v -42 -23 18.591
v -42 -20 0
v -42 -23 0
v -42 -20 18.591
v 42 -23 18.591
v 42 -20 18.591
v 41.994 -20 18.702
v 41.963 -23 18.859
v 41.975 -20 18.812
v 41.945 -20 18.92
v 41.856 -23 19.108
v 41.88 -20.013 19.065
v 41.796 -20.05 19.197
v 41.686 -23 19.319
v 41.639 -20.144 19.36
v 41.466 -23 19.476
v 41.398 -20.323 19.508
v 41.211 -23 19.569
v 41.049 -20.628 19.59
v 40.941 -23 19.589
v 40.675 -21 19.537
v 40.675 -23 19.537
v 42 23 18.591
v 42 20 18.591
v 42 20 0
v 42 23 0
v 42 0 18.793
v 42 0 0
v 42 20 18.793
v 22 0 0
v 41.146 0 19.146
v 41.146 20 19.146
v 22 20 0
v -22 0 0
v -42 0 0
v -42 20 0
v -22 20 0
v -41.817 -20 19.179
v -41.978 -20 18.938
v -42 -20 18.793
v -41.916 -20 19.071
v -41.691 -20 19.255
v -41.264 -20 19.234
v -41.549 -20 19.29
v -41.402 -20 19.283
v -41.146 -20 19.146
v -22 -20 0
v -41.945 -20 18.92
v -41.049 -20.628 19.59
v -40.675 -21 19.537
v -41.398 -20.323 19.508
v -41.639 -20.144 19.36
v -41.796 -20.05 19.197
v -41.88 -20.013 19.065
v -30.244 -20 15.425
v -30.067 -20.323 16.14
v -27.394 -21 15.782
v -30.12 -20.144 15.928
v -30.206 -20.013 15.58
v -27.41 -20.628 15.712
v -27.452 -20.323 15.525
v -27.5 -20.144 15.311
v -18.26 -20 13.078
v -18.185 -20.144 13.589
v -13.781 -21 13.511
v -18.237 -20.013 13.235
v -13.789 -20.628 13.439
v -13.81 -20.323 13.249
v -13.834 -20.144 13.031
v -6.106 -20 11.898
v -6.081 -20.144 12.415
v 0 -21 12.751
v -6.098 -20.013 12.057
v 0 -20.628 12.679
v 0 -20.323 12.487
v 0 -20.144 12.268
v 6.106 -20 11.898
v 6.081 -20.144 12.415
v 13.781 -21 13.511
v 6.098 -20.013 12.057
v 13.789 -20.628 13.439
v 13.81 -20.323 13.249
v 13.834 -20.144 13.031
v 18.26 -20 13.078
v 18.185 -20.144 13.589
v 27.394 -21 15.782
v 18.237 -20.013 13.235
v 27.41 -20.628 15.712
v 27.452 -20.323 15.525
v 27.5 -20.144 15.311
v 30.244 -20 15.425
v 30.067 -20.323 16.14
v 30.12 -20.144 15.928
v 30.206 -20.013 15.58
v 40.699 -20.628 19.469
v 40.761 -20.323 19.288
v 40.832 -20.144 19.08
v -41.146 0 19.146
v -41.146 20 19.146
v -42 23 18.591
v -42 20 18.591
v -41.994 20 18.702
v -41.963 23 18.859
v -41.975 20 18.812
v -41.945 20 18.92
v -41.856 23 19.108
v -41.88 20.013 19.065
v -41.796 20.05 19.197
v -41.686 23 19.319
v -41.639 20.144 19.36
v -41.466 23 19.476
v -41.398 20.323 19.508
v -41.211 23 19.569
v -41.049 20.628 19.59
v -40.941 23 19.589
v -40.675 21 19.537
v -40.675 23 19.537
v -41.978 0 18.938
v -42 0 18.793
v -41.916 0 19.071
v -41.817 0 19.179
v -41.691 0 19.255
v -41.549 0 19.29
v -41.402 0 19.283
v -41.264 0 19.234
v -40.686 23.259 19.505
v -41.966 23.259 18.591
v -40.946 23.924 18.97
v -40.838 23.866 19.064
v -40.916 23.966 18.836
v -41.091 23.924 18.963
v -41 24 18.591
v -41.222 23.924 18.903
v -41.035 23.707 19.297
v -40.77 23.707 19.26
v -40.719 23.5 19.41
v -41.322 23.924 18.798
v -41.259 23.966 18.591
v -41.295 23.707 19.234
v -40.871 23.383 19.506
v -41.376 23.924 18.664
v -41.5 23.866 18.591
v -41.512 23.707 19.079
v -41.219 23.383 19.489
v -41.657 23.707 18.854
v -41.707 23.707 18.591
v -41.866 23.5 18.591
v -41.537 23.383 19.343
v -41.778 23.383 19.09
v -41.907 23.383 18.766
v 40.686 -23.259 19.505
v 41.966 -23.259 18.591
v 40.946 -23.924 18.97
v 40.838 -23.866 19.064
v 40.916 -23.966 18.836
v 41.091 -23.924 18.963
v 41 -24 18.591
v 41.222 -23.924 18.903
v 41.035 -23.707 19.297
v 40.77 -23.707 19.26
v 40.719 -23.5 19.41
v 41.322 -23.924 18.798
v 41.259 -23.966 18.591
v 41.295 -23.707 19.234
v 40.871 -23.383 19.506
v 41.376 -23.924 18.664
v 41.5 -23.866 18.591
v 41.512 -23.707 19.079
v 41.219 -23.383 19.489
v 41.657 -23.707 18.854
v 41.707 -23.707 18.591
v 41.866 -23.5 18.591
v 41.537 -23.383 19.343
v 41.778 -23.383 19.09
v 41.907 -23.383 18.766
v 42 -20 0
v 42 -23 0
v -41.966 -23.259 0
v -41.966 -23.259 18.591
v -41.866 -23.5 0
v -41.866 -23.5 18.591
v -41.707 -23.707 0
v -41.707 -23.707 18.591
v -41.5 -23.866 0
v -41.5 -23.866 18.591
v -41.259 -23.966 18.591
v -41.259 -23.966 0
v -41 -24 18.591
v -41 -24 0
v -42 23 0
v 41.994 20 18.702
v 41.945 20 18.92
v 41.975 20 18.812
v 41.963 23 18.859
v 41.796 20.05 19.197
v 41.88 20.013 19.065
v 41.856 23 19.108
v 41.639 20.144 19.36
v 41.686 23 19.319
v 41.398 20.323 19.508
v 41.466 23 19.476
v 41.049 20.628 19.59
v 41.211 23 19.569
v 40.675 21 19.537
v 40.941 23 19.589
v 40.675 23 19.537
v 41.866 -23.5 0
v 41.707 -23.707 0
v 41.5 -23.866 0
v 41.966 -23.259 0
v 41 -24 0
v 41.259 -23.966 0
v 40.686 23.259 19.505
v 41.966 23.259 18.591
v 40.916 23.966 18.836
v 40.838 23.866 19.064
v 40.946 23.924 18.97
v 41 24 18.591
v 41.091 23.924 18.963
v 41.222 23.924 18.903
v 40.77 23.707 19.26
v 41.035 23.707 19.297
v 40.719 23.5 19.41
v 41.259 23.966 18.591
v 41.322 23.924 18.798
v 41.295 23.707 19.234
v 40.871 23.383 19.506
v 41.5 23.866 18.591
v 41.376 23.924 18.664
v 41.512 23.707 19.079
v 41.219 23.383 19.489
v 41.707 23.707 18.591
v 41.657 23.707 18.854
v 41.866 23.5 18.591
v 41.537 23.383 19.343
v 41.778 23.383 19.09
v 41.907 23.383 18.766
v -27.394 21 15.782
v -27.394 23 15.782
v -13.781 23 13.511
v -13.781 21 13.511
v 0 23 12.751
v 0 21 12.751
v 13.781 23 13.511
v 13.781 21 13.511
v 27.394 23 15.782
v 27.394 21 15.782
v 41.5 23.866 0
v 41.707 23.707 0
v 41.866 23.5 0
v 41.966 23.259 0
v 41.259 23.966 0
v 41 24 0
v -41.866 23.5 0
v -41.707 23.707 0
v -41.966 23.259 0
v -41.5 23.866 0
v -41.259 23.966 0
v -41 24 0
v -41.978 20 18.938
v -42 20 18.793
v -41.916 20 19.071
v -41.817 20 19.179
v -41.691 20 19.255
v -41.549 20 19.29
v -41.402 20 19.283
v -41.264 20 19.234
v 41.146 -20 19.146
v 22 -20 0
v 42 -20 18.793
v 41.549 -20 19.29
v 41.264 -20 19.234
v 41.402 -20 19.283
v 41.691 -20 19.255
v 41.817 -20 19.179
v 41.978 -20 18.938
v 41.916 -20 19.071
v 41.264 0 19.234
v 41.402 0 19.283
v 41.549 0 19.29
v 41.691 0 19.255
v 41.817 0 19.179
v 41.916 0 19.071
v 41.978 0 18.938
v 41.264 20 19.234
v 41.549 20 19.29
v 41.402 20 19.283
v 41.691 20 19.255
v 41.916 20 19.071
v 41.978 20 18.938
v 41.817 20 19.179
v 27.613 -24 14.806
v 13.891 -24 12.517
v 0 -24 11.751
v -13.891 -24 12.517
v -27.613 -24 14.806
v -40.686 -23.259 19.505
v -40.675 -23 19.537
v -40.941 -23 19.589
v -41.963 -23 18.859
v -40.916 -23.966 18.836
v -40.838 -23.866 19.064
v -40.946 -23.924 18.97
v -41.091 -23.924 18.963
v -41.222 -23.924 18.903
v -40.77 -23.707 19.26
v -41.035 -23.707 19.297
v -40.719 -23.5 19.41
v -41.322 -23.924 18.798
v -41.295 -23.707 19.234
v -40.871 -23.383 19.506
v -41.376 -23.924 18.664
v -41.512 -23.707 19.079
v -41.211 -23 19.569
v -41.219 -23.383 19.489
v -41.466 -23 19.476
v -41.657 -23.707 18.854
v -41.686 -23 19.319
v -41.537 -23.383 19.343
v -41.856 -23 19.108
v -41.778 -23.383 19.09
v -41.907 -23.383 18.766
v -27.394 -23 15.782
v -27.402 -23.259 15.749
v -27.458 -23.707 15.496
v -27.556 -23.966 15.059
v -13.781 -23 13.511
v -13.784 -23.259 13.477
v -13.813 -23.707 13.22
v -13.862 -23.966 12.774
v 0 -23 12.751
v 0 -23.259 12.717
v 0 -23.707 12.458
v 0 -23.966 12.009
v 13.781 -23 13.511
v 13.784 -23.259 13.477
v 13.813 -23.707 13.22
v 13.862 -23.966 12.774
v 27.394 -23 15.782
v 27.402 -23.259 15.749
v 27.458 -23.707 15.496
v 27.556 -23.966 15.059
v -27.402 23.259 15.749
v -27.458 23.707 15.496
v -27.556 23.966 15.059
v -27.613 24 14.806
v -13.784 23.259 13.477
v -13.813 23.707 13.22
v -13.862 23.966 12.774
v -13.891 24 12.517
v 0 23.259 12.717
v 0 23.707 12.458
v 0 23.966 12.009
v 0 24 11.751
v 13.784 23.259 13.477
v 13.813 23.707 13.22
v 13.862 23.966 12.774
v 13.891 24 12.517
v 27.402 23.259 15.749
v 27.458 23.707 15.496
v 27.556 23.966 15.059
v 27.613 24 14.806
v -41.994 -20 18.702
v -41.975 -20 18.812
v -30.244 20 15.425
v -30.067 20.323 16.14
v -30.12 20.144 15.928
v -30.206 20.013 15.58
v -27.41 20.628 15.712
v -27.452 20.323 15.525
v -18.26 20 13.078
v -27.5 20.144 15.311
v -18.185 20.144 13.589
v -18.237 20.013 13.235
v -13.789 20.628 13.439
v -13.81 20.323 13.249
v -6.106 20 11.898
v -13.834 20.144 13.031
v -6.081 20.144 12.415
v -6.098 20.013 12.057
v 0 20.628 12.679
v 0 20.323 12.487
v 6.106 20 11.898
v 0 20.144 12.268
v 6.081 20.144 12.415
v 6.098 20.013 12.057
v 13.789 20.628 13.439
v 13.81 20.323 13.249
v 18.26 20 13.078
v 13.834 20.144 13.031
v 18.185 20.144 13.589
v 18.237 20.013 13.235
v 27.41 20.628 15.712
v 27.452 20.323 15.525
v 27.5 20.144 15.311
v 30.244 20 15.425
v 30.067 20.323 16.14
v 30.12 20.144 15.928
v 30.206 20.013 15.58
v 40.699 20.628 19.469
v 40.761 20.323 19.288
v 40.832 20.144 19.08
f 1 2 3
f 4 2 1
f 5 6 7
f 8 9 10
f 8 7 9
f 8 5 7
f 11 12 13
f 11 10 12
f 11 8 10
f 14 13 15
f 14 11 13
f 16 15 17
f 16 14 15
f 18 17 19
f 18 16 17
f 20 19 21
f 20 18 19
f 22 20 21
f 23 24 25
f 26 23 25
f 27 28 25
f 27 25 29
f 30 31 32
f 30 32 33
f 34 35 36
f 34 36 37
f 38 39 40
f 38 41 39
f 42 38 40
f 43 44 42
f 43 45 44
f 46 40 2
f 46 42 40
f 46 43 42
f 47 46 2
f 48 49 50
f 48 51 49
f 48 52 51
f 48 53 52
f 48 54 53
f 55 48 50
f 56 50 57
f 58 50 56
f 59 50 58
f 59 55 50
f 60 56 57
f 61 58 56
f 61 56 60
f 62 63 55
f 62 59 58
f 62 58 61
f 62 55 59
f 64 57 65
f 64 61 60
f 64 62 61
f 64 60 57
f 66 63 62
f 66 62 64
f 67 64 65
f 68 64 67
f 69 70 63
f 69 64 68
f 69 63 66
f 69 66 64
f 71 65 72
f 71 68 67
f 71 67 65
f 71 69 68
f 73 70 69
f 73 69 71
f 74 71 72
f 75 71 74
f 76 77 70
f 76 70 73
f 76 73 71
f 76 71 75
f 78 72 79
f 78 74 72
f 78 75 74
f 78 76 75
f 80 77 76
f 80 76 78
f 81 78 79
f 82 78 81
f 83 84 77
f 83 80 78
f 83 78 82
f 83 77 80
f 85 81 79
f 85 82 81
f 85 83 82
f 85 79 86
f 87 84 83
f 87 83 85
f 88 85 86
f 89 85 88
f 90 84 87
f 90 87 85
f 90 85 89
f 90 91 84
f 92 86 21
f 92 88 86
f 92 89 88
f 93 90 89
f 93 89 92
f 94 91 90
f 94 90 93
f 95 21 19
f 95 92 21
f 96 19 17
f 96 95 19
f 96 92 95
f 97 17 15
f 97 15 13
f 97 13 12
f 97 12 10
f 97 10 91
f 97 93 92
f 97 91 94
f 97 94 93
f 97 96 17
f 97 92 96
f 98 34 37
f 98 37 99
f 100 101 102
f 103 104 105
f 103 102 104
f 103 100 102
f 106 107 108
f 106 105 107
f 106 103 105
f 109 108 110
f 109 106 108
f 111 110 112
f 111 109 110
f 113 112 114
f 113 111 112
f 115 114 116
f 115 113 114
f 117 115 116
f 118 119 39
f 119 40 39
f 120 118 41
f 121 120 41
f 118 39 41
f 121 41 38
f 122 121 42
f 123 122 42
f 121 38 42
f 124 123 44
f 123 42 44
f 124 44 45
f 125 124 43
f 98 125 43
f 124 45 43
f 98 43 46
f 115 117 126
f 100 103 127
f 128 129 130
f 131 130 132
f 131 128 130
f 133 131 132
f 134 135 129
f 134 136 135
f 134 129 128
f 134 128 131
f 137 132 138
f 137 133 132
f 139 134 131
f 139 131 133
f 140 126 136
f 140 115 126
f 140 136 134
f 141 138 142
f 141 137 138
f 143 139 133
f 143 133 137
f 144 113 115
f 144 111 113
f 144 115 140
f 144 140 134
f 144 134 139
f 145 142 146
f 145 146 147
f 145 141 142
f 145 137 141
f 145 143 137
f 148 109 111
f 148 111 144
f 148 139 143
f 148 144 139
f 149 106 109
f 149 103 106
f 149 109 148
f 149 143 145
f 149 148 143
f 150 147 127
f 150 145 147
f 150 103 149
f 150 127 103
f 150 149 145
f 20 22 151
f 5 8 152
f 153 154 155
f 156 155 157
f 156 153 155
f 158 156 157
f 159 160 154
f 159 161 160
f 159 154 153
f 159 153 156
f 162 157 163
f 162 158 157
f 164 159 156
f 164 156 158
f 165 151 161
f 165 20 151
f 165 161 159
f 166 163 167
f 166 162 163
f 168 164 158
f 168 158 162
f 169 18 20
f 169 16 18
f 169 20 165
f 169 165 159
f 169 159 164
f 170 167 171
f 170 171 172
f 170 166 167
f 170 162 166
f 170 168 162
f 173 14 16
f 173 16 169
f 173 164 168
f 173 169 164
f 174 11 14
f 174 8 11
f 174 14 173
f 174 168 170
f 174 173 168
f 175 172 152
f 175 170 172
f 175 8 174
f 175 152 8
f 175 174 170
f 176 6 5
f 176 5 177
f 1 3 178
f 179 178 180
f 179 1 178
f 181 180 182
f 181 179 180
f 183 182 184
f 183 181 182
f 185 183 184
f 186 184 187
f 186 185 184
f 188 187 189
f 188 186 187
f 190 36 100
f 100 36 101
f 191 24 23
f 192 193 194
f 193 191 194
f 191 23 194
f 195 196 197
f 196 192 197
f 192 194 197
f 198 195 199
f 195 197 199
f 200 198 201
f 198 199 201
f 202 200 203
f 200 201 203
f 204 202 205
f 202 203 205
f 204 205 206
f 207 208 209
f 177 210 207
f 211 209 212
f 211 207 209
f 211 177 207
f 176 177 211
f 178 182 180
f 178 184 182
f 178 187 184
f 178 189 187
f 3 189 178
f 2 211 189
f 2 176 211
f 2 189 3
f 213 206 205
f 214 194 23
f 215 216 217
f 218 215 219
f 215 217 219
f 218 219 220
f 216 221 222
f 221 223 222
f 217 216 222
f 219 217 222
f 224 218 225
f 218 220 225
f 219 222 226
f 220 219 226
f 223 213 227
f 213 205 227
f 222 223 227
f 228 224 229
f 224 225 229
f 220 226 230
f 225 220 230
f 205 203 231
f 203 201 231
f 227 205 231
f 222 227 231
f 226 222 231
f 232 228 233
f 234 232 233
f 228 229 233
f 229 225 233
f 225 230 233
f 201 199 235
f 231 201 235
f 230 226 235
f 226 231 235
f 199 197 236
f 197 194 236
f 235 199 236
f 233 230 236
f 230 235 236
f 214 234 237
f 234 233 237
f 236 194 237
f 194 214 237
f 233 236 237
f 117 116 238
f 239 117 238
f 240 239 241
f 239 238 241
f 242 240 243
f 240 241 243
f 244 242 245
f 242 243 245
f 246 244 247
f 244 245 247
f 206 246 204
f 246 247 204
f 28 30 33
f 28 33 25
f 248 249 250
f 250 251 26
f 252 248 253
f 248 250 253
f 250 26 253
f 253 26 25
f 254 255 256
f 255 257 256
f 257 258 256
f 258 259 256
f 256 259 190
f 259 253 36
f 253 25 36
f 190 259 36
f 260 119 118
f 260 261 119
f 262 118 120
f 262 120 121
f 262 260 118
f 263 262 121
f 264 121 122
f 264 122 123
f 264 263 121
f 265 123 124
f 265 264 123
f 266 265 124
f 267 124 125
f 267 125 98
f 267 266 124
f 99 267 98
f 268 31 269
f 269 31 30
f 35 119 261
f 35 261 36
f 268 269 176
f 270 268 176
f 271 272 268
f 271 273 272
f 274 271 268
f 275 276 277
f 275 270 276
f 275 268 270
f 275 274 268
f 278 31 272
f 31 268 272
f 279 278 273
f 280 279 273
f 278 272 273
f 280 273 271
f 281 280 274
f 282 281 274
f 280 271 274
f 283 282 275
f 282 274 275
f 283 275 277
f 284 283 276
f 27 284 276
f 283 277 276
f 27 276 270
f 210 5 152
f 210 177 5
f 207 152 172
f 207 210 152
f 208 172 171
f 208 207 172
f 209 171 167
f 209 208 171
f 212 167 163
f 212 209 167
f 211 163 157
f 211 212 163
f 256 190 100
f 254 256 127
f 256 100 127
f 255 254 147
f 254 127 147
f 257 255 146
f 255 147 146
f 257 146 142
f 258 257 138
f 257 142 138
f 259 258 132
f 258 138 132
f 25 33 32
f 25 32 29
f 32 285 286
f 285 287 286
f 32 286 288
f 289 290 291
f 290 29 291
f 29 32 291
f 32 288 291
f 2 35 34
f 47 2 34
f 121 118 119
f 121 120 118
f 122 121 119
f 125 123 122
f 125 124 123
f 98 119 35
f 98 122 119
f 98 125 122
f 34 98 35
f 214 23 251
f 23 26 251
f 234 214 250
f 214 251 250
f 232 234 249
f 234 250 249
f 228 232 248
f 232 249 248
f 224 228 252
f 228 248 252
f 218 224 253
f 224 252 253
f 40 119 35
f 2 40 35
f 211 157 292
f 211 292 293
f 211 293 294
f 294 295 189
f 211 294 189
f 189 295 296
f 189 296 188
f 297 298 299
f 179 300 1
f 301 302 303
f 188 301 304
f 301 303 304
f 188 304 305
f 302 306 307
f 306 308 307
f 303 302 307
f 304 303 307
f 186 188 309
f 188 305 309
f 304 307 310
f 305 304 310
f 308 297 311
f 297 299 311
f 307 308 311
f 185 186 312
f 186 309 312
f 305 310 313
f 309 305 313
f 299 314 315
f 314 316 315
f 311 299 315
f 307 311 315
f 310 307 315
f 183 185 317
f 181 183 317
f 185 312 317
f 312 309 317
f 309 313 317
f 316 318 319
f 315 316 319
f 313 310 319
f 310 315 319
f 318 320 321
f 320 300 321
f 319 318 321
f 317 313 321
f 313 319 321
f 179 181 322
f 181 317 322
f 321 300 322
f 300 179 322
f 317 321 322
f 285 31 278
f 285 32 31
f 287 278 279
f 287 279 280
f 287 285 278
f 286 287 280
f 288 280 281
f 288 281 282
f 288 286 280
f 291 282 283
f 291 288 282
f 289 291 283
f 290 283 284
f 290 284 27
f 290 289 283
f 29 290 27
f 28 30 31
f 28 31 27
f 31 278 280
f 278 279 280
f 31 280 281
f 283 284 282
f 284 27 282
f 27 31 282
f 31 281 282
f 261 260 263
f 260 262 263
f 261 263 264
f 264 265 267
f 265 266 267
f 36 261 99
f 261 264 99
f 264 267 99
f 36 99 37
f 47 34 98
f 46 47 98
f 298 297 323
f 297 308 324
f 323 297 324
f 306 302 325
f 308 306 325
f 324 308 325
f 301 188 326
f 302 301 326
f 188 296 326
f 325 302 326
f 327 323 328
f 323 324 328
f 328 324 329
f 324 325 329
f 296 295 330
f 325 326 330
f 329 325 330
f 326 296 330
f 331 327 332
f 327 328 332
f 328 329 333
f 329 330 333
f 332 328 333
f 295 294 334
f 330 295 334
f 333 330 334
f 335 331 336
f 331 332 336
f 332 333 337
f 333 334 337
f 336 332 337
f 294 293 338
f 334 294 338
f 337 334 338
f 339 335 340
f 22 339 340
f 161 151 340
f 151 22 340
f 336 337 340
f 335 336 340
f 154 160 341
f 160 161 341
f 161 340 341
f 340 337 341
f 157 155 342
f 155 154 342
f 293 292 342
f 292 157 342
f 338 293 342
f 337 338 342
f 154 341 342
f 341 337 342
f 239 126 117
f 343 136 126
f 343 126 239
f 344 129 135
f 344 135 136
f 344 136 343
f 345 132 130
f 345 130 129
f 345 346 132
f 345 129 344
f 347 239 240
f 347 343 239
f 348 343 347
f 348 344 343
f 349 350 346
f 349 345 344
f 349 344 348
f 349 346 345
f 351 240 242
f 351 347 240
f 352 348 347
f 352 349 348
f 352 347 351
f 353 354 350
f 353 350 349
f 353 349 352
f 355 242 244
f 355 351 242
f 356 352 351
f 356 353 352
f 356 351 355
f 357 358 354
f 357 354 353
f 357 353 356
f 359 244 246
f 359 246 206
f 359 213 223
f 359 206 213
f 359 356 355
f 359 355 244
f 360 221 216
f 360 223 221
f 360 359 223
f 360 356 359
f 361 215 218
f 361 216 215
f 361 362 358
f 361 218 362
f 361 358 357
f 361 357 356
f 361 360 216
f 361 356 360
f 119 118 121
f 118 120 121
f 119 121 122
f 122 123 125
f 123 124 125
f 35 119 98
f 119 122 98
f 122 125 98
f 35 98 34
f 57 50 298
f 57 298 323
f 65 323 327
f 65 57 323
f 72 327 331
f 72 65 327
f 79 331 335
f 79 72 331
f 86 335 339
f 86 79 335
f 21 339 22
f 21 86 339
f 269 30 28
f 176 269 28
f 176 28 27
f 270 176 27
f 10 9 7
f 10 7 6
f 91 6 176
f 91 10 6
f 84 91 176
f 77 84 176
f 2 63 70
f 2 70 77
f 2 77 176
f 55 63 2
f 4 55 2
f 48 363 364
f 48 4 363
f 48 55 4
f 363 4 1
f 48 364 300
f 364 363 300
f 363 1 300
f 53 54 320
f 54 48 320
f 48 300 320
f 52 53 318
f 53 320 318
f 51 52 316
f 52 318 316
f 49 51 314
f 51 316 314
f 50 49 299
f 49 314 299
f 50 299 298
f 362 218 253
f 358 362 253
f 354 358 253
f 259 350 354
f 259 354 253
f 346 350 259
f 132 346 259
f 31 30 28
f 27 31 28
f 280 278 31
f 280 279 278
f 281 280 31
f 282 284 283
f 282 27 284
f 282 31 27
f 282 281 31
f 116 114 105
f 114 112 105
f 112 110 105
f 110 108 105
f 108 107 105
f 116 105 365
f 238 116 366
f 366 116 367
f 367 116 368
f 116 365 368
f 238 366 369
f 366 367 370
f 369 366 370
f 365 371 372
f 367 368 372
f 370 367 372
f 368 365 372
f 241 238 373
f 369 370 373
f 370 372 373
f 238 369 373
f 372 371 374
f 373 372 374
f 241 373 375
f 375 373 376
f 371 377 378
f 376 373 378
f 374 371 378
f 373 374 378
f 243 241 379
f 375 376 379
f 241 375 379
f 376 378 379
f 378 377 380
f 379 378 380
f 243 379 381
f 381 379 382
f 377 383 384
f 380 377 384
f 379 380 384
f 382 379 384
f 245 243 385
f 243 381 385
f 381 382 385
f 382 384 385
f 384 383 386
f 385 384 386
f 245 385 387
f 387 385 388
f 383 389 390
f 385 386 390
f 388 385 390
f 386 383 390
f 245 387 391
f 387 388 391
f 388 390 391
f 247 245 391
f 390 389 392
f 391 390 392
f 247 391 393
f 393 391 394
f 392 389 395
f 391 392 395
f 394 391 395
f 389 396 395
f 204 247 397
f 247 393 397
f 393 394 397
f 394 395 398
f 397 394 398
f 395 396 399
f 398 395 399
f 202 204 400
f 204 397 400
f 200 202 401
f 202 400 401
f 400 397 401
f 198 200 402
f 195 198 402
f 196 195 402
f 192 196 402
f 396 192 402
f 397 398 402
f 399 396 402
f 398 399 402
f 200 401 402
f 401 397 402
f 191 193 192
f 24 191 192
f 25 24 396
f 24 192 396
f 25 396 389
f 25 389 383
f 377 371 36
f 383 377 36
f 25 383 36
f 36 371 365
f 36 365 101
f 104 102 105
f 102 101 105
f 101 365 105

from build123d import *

# Parameters (mm, degrees)
F1_DEPTH = 20
F3_DEPTH = 4
F4_R     = 1
F5_R     = 0.5


with BuildPart() as f1:
    # F0 (on Front) → F1 (new body)
    with BuildSketch(Plane.XZ):
        Polygon((-42, 20), (-42, 0), (-22, 0), align=None)
        Polygon((42, 20), (22, 0), (42, 0), align=None)
    extrude(amount=-F1_DEPTH)

    # F5
    f5_edges = [f1.edges().sort_by_distance(p)[0] for p in [
        (42, 10, 20),
        (-42, 10, 20),
    ]]
    fillet(f5_edges, radius=F5_R)


with BuildPart() as f3:
    # F2 (on face) → F3 (new body)
    with BuildSketch(Plane(origin=(0, 20, 0), x_dir=(-1, 0, 0), z_dir=(0, 1, 0))):
        Polygon((-22, 0), (-42, 20), (-42, 0), align=None)
        with BuildLine():
            ThreePointArc((42, 20), (0, 12.750598), (-42, 20))
            Line((-42, 20), (-22, 0))
            Line((-22, 0), (42, 0))
            Line((42, 0), (42, 20))
        make_face()
    extrude(amount=F3_DEPTH)

    # F4
    f4_edges = [f3.edges().sort_by_distance(p)[0] for p in [
        (-42, 22, 20),
        (42, 22, 20),
        (0, 20, 12.750598),
        (0, 24, 12.750598),
        (42, 24, 10),
        (-42, 24, 10),
    ]]
    fillet(f4_edges, radius=F4_R)


with BuildPart() as f6_1:
    # F6: instance of F1
    add(f1.part.mirror(Plane.XZ))


with BuildPart() as f6_2:
    # F6: instance of F3
    add(f3.part.mirror(Plane.XZ))


solid = Compound([f1.part, f3.part, f6_1.part, f6_2.part])
